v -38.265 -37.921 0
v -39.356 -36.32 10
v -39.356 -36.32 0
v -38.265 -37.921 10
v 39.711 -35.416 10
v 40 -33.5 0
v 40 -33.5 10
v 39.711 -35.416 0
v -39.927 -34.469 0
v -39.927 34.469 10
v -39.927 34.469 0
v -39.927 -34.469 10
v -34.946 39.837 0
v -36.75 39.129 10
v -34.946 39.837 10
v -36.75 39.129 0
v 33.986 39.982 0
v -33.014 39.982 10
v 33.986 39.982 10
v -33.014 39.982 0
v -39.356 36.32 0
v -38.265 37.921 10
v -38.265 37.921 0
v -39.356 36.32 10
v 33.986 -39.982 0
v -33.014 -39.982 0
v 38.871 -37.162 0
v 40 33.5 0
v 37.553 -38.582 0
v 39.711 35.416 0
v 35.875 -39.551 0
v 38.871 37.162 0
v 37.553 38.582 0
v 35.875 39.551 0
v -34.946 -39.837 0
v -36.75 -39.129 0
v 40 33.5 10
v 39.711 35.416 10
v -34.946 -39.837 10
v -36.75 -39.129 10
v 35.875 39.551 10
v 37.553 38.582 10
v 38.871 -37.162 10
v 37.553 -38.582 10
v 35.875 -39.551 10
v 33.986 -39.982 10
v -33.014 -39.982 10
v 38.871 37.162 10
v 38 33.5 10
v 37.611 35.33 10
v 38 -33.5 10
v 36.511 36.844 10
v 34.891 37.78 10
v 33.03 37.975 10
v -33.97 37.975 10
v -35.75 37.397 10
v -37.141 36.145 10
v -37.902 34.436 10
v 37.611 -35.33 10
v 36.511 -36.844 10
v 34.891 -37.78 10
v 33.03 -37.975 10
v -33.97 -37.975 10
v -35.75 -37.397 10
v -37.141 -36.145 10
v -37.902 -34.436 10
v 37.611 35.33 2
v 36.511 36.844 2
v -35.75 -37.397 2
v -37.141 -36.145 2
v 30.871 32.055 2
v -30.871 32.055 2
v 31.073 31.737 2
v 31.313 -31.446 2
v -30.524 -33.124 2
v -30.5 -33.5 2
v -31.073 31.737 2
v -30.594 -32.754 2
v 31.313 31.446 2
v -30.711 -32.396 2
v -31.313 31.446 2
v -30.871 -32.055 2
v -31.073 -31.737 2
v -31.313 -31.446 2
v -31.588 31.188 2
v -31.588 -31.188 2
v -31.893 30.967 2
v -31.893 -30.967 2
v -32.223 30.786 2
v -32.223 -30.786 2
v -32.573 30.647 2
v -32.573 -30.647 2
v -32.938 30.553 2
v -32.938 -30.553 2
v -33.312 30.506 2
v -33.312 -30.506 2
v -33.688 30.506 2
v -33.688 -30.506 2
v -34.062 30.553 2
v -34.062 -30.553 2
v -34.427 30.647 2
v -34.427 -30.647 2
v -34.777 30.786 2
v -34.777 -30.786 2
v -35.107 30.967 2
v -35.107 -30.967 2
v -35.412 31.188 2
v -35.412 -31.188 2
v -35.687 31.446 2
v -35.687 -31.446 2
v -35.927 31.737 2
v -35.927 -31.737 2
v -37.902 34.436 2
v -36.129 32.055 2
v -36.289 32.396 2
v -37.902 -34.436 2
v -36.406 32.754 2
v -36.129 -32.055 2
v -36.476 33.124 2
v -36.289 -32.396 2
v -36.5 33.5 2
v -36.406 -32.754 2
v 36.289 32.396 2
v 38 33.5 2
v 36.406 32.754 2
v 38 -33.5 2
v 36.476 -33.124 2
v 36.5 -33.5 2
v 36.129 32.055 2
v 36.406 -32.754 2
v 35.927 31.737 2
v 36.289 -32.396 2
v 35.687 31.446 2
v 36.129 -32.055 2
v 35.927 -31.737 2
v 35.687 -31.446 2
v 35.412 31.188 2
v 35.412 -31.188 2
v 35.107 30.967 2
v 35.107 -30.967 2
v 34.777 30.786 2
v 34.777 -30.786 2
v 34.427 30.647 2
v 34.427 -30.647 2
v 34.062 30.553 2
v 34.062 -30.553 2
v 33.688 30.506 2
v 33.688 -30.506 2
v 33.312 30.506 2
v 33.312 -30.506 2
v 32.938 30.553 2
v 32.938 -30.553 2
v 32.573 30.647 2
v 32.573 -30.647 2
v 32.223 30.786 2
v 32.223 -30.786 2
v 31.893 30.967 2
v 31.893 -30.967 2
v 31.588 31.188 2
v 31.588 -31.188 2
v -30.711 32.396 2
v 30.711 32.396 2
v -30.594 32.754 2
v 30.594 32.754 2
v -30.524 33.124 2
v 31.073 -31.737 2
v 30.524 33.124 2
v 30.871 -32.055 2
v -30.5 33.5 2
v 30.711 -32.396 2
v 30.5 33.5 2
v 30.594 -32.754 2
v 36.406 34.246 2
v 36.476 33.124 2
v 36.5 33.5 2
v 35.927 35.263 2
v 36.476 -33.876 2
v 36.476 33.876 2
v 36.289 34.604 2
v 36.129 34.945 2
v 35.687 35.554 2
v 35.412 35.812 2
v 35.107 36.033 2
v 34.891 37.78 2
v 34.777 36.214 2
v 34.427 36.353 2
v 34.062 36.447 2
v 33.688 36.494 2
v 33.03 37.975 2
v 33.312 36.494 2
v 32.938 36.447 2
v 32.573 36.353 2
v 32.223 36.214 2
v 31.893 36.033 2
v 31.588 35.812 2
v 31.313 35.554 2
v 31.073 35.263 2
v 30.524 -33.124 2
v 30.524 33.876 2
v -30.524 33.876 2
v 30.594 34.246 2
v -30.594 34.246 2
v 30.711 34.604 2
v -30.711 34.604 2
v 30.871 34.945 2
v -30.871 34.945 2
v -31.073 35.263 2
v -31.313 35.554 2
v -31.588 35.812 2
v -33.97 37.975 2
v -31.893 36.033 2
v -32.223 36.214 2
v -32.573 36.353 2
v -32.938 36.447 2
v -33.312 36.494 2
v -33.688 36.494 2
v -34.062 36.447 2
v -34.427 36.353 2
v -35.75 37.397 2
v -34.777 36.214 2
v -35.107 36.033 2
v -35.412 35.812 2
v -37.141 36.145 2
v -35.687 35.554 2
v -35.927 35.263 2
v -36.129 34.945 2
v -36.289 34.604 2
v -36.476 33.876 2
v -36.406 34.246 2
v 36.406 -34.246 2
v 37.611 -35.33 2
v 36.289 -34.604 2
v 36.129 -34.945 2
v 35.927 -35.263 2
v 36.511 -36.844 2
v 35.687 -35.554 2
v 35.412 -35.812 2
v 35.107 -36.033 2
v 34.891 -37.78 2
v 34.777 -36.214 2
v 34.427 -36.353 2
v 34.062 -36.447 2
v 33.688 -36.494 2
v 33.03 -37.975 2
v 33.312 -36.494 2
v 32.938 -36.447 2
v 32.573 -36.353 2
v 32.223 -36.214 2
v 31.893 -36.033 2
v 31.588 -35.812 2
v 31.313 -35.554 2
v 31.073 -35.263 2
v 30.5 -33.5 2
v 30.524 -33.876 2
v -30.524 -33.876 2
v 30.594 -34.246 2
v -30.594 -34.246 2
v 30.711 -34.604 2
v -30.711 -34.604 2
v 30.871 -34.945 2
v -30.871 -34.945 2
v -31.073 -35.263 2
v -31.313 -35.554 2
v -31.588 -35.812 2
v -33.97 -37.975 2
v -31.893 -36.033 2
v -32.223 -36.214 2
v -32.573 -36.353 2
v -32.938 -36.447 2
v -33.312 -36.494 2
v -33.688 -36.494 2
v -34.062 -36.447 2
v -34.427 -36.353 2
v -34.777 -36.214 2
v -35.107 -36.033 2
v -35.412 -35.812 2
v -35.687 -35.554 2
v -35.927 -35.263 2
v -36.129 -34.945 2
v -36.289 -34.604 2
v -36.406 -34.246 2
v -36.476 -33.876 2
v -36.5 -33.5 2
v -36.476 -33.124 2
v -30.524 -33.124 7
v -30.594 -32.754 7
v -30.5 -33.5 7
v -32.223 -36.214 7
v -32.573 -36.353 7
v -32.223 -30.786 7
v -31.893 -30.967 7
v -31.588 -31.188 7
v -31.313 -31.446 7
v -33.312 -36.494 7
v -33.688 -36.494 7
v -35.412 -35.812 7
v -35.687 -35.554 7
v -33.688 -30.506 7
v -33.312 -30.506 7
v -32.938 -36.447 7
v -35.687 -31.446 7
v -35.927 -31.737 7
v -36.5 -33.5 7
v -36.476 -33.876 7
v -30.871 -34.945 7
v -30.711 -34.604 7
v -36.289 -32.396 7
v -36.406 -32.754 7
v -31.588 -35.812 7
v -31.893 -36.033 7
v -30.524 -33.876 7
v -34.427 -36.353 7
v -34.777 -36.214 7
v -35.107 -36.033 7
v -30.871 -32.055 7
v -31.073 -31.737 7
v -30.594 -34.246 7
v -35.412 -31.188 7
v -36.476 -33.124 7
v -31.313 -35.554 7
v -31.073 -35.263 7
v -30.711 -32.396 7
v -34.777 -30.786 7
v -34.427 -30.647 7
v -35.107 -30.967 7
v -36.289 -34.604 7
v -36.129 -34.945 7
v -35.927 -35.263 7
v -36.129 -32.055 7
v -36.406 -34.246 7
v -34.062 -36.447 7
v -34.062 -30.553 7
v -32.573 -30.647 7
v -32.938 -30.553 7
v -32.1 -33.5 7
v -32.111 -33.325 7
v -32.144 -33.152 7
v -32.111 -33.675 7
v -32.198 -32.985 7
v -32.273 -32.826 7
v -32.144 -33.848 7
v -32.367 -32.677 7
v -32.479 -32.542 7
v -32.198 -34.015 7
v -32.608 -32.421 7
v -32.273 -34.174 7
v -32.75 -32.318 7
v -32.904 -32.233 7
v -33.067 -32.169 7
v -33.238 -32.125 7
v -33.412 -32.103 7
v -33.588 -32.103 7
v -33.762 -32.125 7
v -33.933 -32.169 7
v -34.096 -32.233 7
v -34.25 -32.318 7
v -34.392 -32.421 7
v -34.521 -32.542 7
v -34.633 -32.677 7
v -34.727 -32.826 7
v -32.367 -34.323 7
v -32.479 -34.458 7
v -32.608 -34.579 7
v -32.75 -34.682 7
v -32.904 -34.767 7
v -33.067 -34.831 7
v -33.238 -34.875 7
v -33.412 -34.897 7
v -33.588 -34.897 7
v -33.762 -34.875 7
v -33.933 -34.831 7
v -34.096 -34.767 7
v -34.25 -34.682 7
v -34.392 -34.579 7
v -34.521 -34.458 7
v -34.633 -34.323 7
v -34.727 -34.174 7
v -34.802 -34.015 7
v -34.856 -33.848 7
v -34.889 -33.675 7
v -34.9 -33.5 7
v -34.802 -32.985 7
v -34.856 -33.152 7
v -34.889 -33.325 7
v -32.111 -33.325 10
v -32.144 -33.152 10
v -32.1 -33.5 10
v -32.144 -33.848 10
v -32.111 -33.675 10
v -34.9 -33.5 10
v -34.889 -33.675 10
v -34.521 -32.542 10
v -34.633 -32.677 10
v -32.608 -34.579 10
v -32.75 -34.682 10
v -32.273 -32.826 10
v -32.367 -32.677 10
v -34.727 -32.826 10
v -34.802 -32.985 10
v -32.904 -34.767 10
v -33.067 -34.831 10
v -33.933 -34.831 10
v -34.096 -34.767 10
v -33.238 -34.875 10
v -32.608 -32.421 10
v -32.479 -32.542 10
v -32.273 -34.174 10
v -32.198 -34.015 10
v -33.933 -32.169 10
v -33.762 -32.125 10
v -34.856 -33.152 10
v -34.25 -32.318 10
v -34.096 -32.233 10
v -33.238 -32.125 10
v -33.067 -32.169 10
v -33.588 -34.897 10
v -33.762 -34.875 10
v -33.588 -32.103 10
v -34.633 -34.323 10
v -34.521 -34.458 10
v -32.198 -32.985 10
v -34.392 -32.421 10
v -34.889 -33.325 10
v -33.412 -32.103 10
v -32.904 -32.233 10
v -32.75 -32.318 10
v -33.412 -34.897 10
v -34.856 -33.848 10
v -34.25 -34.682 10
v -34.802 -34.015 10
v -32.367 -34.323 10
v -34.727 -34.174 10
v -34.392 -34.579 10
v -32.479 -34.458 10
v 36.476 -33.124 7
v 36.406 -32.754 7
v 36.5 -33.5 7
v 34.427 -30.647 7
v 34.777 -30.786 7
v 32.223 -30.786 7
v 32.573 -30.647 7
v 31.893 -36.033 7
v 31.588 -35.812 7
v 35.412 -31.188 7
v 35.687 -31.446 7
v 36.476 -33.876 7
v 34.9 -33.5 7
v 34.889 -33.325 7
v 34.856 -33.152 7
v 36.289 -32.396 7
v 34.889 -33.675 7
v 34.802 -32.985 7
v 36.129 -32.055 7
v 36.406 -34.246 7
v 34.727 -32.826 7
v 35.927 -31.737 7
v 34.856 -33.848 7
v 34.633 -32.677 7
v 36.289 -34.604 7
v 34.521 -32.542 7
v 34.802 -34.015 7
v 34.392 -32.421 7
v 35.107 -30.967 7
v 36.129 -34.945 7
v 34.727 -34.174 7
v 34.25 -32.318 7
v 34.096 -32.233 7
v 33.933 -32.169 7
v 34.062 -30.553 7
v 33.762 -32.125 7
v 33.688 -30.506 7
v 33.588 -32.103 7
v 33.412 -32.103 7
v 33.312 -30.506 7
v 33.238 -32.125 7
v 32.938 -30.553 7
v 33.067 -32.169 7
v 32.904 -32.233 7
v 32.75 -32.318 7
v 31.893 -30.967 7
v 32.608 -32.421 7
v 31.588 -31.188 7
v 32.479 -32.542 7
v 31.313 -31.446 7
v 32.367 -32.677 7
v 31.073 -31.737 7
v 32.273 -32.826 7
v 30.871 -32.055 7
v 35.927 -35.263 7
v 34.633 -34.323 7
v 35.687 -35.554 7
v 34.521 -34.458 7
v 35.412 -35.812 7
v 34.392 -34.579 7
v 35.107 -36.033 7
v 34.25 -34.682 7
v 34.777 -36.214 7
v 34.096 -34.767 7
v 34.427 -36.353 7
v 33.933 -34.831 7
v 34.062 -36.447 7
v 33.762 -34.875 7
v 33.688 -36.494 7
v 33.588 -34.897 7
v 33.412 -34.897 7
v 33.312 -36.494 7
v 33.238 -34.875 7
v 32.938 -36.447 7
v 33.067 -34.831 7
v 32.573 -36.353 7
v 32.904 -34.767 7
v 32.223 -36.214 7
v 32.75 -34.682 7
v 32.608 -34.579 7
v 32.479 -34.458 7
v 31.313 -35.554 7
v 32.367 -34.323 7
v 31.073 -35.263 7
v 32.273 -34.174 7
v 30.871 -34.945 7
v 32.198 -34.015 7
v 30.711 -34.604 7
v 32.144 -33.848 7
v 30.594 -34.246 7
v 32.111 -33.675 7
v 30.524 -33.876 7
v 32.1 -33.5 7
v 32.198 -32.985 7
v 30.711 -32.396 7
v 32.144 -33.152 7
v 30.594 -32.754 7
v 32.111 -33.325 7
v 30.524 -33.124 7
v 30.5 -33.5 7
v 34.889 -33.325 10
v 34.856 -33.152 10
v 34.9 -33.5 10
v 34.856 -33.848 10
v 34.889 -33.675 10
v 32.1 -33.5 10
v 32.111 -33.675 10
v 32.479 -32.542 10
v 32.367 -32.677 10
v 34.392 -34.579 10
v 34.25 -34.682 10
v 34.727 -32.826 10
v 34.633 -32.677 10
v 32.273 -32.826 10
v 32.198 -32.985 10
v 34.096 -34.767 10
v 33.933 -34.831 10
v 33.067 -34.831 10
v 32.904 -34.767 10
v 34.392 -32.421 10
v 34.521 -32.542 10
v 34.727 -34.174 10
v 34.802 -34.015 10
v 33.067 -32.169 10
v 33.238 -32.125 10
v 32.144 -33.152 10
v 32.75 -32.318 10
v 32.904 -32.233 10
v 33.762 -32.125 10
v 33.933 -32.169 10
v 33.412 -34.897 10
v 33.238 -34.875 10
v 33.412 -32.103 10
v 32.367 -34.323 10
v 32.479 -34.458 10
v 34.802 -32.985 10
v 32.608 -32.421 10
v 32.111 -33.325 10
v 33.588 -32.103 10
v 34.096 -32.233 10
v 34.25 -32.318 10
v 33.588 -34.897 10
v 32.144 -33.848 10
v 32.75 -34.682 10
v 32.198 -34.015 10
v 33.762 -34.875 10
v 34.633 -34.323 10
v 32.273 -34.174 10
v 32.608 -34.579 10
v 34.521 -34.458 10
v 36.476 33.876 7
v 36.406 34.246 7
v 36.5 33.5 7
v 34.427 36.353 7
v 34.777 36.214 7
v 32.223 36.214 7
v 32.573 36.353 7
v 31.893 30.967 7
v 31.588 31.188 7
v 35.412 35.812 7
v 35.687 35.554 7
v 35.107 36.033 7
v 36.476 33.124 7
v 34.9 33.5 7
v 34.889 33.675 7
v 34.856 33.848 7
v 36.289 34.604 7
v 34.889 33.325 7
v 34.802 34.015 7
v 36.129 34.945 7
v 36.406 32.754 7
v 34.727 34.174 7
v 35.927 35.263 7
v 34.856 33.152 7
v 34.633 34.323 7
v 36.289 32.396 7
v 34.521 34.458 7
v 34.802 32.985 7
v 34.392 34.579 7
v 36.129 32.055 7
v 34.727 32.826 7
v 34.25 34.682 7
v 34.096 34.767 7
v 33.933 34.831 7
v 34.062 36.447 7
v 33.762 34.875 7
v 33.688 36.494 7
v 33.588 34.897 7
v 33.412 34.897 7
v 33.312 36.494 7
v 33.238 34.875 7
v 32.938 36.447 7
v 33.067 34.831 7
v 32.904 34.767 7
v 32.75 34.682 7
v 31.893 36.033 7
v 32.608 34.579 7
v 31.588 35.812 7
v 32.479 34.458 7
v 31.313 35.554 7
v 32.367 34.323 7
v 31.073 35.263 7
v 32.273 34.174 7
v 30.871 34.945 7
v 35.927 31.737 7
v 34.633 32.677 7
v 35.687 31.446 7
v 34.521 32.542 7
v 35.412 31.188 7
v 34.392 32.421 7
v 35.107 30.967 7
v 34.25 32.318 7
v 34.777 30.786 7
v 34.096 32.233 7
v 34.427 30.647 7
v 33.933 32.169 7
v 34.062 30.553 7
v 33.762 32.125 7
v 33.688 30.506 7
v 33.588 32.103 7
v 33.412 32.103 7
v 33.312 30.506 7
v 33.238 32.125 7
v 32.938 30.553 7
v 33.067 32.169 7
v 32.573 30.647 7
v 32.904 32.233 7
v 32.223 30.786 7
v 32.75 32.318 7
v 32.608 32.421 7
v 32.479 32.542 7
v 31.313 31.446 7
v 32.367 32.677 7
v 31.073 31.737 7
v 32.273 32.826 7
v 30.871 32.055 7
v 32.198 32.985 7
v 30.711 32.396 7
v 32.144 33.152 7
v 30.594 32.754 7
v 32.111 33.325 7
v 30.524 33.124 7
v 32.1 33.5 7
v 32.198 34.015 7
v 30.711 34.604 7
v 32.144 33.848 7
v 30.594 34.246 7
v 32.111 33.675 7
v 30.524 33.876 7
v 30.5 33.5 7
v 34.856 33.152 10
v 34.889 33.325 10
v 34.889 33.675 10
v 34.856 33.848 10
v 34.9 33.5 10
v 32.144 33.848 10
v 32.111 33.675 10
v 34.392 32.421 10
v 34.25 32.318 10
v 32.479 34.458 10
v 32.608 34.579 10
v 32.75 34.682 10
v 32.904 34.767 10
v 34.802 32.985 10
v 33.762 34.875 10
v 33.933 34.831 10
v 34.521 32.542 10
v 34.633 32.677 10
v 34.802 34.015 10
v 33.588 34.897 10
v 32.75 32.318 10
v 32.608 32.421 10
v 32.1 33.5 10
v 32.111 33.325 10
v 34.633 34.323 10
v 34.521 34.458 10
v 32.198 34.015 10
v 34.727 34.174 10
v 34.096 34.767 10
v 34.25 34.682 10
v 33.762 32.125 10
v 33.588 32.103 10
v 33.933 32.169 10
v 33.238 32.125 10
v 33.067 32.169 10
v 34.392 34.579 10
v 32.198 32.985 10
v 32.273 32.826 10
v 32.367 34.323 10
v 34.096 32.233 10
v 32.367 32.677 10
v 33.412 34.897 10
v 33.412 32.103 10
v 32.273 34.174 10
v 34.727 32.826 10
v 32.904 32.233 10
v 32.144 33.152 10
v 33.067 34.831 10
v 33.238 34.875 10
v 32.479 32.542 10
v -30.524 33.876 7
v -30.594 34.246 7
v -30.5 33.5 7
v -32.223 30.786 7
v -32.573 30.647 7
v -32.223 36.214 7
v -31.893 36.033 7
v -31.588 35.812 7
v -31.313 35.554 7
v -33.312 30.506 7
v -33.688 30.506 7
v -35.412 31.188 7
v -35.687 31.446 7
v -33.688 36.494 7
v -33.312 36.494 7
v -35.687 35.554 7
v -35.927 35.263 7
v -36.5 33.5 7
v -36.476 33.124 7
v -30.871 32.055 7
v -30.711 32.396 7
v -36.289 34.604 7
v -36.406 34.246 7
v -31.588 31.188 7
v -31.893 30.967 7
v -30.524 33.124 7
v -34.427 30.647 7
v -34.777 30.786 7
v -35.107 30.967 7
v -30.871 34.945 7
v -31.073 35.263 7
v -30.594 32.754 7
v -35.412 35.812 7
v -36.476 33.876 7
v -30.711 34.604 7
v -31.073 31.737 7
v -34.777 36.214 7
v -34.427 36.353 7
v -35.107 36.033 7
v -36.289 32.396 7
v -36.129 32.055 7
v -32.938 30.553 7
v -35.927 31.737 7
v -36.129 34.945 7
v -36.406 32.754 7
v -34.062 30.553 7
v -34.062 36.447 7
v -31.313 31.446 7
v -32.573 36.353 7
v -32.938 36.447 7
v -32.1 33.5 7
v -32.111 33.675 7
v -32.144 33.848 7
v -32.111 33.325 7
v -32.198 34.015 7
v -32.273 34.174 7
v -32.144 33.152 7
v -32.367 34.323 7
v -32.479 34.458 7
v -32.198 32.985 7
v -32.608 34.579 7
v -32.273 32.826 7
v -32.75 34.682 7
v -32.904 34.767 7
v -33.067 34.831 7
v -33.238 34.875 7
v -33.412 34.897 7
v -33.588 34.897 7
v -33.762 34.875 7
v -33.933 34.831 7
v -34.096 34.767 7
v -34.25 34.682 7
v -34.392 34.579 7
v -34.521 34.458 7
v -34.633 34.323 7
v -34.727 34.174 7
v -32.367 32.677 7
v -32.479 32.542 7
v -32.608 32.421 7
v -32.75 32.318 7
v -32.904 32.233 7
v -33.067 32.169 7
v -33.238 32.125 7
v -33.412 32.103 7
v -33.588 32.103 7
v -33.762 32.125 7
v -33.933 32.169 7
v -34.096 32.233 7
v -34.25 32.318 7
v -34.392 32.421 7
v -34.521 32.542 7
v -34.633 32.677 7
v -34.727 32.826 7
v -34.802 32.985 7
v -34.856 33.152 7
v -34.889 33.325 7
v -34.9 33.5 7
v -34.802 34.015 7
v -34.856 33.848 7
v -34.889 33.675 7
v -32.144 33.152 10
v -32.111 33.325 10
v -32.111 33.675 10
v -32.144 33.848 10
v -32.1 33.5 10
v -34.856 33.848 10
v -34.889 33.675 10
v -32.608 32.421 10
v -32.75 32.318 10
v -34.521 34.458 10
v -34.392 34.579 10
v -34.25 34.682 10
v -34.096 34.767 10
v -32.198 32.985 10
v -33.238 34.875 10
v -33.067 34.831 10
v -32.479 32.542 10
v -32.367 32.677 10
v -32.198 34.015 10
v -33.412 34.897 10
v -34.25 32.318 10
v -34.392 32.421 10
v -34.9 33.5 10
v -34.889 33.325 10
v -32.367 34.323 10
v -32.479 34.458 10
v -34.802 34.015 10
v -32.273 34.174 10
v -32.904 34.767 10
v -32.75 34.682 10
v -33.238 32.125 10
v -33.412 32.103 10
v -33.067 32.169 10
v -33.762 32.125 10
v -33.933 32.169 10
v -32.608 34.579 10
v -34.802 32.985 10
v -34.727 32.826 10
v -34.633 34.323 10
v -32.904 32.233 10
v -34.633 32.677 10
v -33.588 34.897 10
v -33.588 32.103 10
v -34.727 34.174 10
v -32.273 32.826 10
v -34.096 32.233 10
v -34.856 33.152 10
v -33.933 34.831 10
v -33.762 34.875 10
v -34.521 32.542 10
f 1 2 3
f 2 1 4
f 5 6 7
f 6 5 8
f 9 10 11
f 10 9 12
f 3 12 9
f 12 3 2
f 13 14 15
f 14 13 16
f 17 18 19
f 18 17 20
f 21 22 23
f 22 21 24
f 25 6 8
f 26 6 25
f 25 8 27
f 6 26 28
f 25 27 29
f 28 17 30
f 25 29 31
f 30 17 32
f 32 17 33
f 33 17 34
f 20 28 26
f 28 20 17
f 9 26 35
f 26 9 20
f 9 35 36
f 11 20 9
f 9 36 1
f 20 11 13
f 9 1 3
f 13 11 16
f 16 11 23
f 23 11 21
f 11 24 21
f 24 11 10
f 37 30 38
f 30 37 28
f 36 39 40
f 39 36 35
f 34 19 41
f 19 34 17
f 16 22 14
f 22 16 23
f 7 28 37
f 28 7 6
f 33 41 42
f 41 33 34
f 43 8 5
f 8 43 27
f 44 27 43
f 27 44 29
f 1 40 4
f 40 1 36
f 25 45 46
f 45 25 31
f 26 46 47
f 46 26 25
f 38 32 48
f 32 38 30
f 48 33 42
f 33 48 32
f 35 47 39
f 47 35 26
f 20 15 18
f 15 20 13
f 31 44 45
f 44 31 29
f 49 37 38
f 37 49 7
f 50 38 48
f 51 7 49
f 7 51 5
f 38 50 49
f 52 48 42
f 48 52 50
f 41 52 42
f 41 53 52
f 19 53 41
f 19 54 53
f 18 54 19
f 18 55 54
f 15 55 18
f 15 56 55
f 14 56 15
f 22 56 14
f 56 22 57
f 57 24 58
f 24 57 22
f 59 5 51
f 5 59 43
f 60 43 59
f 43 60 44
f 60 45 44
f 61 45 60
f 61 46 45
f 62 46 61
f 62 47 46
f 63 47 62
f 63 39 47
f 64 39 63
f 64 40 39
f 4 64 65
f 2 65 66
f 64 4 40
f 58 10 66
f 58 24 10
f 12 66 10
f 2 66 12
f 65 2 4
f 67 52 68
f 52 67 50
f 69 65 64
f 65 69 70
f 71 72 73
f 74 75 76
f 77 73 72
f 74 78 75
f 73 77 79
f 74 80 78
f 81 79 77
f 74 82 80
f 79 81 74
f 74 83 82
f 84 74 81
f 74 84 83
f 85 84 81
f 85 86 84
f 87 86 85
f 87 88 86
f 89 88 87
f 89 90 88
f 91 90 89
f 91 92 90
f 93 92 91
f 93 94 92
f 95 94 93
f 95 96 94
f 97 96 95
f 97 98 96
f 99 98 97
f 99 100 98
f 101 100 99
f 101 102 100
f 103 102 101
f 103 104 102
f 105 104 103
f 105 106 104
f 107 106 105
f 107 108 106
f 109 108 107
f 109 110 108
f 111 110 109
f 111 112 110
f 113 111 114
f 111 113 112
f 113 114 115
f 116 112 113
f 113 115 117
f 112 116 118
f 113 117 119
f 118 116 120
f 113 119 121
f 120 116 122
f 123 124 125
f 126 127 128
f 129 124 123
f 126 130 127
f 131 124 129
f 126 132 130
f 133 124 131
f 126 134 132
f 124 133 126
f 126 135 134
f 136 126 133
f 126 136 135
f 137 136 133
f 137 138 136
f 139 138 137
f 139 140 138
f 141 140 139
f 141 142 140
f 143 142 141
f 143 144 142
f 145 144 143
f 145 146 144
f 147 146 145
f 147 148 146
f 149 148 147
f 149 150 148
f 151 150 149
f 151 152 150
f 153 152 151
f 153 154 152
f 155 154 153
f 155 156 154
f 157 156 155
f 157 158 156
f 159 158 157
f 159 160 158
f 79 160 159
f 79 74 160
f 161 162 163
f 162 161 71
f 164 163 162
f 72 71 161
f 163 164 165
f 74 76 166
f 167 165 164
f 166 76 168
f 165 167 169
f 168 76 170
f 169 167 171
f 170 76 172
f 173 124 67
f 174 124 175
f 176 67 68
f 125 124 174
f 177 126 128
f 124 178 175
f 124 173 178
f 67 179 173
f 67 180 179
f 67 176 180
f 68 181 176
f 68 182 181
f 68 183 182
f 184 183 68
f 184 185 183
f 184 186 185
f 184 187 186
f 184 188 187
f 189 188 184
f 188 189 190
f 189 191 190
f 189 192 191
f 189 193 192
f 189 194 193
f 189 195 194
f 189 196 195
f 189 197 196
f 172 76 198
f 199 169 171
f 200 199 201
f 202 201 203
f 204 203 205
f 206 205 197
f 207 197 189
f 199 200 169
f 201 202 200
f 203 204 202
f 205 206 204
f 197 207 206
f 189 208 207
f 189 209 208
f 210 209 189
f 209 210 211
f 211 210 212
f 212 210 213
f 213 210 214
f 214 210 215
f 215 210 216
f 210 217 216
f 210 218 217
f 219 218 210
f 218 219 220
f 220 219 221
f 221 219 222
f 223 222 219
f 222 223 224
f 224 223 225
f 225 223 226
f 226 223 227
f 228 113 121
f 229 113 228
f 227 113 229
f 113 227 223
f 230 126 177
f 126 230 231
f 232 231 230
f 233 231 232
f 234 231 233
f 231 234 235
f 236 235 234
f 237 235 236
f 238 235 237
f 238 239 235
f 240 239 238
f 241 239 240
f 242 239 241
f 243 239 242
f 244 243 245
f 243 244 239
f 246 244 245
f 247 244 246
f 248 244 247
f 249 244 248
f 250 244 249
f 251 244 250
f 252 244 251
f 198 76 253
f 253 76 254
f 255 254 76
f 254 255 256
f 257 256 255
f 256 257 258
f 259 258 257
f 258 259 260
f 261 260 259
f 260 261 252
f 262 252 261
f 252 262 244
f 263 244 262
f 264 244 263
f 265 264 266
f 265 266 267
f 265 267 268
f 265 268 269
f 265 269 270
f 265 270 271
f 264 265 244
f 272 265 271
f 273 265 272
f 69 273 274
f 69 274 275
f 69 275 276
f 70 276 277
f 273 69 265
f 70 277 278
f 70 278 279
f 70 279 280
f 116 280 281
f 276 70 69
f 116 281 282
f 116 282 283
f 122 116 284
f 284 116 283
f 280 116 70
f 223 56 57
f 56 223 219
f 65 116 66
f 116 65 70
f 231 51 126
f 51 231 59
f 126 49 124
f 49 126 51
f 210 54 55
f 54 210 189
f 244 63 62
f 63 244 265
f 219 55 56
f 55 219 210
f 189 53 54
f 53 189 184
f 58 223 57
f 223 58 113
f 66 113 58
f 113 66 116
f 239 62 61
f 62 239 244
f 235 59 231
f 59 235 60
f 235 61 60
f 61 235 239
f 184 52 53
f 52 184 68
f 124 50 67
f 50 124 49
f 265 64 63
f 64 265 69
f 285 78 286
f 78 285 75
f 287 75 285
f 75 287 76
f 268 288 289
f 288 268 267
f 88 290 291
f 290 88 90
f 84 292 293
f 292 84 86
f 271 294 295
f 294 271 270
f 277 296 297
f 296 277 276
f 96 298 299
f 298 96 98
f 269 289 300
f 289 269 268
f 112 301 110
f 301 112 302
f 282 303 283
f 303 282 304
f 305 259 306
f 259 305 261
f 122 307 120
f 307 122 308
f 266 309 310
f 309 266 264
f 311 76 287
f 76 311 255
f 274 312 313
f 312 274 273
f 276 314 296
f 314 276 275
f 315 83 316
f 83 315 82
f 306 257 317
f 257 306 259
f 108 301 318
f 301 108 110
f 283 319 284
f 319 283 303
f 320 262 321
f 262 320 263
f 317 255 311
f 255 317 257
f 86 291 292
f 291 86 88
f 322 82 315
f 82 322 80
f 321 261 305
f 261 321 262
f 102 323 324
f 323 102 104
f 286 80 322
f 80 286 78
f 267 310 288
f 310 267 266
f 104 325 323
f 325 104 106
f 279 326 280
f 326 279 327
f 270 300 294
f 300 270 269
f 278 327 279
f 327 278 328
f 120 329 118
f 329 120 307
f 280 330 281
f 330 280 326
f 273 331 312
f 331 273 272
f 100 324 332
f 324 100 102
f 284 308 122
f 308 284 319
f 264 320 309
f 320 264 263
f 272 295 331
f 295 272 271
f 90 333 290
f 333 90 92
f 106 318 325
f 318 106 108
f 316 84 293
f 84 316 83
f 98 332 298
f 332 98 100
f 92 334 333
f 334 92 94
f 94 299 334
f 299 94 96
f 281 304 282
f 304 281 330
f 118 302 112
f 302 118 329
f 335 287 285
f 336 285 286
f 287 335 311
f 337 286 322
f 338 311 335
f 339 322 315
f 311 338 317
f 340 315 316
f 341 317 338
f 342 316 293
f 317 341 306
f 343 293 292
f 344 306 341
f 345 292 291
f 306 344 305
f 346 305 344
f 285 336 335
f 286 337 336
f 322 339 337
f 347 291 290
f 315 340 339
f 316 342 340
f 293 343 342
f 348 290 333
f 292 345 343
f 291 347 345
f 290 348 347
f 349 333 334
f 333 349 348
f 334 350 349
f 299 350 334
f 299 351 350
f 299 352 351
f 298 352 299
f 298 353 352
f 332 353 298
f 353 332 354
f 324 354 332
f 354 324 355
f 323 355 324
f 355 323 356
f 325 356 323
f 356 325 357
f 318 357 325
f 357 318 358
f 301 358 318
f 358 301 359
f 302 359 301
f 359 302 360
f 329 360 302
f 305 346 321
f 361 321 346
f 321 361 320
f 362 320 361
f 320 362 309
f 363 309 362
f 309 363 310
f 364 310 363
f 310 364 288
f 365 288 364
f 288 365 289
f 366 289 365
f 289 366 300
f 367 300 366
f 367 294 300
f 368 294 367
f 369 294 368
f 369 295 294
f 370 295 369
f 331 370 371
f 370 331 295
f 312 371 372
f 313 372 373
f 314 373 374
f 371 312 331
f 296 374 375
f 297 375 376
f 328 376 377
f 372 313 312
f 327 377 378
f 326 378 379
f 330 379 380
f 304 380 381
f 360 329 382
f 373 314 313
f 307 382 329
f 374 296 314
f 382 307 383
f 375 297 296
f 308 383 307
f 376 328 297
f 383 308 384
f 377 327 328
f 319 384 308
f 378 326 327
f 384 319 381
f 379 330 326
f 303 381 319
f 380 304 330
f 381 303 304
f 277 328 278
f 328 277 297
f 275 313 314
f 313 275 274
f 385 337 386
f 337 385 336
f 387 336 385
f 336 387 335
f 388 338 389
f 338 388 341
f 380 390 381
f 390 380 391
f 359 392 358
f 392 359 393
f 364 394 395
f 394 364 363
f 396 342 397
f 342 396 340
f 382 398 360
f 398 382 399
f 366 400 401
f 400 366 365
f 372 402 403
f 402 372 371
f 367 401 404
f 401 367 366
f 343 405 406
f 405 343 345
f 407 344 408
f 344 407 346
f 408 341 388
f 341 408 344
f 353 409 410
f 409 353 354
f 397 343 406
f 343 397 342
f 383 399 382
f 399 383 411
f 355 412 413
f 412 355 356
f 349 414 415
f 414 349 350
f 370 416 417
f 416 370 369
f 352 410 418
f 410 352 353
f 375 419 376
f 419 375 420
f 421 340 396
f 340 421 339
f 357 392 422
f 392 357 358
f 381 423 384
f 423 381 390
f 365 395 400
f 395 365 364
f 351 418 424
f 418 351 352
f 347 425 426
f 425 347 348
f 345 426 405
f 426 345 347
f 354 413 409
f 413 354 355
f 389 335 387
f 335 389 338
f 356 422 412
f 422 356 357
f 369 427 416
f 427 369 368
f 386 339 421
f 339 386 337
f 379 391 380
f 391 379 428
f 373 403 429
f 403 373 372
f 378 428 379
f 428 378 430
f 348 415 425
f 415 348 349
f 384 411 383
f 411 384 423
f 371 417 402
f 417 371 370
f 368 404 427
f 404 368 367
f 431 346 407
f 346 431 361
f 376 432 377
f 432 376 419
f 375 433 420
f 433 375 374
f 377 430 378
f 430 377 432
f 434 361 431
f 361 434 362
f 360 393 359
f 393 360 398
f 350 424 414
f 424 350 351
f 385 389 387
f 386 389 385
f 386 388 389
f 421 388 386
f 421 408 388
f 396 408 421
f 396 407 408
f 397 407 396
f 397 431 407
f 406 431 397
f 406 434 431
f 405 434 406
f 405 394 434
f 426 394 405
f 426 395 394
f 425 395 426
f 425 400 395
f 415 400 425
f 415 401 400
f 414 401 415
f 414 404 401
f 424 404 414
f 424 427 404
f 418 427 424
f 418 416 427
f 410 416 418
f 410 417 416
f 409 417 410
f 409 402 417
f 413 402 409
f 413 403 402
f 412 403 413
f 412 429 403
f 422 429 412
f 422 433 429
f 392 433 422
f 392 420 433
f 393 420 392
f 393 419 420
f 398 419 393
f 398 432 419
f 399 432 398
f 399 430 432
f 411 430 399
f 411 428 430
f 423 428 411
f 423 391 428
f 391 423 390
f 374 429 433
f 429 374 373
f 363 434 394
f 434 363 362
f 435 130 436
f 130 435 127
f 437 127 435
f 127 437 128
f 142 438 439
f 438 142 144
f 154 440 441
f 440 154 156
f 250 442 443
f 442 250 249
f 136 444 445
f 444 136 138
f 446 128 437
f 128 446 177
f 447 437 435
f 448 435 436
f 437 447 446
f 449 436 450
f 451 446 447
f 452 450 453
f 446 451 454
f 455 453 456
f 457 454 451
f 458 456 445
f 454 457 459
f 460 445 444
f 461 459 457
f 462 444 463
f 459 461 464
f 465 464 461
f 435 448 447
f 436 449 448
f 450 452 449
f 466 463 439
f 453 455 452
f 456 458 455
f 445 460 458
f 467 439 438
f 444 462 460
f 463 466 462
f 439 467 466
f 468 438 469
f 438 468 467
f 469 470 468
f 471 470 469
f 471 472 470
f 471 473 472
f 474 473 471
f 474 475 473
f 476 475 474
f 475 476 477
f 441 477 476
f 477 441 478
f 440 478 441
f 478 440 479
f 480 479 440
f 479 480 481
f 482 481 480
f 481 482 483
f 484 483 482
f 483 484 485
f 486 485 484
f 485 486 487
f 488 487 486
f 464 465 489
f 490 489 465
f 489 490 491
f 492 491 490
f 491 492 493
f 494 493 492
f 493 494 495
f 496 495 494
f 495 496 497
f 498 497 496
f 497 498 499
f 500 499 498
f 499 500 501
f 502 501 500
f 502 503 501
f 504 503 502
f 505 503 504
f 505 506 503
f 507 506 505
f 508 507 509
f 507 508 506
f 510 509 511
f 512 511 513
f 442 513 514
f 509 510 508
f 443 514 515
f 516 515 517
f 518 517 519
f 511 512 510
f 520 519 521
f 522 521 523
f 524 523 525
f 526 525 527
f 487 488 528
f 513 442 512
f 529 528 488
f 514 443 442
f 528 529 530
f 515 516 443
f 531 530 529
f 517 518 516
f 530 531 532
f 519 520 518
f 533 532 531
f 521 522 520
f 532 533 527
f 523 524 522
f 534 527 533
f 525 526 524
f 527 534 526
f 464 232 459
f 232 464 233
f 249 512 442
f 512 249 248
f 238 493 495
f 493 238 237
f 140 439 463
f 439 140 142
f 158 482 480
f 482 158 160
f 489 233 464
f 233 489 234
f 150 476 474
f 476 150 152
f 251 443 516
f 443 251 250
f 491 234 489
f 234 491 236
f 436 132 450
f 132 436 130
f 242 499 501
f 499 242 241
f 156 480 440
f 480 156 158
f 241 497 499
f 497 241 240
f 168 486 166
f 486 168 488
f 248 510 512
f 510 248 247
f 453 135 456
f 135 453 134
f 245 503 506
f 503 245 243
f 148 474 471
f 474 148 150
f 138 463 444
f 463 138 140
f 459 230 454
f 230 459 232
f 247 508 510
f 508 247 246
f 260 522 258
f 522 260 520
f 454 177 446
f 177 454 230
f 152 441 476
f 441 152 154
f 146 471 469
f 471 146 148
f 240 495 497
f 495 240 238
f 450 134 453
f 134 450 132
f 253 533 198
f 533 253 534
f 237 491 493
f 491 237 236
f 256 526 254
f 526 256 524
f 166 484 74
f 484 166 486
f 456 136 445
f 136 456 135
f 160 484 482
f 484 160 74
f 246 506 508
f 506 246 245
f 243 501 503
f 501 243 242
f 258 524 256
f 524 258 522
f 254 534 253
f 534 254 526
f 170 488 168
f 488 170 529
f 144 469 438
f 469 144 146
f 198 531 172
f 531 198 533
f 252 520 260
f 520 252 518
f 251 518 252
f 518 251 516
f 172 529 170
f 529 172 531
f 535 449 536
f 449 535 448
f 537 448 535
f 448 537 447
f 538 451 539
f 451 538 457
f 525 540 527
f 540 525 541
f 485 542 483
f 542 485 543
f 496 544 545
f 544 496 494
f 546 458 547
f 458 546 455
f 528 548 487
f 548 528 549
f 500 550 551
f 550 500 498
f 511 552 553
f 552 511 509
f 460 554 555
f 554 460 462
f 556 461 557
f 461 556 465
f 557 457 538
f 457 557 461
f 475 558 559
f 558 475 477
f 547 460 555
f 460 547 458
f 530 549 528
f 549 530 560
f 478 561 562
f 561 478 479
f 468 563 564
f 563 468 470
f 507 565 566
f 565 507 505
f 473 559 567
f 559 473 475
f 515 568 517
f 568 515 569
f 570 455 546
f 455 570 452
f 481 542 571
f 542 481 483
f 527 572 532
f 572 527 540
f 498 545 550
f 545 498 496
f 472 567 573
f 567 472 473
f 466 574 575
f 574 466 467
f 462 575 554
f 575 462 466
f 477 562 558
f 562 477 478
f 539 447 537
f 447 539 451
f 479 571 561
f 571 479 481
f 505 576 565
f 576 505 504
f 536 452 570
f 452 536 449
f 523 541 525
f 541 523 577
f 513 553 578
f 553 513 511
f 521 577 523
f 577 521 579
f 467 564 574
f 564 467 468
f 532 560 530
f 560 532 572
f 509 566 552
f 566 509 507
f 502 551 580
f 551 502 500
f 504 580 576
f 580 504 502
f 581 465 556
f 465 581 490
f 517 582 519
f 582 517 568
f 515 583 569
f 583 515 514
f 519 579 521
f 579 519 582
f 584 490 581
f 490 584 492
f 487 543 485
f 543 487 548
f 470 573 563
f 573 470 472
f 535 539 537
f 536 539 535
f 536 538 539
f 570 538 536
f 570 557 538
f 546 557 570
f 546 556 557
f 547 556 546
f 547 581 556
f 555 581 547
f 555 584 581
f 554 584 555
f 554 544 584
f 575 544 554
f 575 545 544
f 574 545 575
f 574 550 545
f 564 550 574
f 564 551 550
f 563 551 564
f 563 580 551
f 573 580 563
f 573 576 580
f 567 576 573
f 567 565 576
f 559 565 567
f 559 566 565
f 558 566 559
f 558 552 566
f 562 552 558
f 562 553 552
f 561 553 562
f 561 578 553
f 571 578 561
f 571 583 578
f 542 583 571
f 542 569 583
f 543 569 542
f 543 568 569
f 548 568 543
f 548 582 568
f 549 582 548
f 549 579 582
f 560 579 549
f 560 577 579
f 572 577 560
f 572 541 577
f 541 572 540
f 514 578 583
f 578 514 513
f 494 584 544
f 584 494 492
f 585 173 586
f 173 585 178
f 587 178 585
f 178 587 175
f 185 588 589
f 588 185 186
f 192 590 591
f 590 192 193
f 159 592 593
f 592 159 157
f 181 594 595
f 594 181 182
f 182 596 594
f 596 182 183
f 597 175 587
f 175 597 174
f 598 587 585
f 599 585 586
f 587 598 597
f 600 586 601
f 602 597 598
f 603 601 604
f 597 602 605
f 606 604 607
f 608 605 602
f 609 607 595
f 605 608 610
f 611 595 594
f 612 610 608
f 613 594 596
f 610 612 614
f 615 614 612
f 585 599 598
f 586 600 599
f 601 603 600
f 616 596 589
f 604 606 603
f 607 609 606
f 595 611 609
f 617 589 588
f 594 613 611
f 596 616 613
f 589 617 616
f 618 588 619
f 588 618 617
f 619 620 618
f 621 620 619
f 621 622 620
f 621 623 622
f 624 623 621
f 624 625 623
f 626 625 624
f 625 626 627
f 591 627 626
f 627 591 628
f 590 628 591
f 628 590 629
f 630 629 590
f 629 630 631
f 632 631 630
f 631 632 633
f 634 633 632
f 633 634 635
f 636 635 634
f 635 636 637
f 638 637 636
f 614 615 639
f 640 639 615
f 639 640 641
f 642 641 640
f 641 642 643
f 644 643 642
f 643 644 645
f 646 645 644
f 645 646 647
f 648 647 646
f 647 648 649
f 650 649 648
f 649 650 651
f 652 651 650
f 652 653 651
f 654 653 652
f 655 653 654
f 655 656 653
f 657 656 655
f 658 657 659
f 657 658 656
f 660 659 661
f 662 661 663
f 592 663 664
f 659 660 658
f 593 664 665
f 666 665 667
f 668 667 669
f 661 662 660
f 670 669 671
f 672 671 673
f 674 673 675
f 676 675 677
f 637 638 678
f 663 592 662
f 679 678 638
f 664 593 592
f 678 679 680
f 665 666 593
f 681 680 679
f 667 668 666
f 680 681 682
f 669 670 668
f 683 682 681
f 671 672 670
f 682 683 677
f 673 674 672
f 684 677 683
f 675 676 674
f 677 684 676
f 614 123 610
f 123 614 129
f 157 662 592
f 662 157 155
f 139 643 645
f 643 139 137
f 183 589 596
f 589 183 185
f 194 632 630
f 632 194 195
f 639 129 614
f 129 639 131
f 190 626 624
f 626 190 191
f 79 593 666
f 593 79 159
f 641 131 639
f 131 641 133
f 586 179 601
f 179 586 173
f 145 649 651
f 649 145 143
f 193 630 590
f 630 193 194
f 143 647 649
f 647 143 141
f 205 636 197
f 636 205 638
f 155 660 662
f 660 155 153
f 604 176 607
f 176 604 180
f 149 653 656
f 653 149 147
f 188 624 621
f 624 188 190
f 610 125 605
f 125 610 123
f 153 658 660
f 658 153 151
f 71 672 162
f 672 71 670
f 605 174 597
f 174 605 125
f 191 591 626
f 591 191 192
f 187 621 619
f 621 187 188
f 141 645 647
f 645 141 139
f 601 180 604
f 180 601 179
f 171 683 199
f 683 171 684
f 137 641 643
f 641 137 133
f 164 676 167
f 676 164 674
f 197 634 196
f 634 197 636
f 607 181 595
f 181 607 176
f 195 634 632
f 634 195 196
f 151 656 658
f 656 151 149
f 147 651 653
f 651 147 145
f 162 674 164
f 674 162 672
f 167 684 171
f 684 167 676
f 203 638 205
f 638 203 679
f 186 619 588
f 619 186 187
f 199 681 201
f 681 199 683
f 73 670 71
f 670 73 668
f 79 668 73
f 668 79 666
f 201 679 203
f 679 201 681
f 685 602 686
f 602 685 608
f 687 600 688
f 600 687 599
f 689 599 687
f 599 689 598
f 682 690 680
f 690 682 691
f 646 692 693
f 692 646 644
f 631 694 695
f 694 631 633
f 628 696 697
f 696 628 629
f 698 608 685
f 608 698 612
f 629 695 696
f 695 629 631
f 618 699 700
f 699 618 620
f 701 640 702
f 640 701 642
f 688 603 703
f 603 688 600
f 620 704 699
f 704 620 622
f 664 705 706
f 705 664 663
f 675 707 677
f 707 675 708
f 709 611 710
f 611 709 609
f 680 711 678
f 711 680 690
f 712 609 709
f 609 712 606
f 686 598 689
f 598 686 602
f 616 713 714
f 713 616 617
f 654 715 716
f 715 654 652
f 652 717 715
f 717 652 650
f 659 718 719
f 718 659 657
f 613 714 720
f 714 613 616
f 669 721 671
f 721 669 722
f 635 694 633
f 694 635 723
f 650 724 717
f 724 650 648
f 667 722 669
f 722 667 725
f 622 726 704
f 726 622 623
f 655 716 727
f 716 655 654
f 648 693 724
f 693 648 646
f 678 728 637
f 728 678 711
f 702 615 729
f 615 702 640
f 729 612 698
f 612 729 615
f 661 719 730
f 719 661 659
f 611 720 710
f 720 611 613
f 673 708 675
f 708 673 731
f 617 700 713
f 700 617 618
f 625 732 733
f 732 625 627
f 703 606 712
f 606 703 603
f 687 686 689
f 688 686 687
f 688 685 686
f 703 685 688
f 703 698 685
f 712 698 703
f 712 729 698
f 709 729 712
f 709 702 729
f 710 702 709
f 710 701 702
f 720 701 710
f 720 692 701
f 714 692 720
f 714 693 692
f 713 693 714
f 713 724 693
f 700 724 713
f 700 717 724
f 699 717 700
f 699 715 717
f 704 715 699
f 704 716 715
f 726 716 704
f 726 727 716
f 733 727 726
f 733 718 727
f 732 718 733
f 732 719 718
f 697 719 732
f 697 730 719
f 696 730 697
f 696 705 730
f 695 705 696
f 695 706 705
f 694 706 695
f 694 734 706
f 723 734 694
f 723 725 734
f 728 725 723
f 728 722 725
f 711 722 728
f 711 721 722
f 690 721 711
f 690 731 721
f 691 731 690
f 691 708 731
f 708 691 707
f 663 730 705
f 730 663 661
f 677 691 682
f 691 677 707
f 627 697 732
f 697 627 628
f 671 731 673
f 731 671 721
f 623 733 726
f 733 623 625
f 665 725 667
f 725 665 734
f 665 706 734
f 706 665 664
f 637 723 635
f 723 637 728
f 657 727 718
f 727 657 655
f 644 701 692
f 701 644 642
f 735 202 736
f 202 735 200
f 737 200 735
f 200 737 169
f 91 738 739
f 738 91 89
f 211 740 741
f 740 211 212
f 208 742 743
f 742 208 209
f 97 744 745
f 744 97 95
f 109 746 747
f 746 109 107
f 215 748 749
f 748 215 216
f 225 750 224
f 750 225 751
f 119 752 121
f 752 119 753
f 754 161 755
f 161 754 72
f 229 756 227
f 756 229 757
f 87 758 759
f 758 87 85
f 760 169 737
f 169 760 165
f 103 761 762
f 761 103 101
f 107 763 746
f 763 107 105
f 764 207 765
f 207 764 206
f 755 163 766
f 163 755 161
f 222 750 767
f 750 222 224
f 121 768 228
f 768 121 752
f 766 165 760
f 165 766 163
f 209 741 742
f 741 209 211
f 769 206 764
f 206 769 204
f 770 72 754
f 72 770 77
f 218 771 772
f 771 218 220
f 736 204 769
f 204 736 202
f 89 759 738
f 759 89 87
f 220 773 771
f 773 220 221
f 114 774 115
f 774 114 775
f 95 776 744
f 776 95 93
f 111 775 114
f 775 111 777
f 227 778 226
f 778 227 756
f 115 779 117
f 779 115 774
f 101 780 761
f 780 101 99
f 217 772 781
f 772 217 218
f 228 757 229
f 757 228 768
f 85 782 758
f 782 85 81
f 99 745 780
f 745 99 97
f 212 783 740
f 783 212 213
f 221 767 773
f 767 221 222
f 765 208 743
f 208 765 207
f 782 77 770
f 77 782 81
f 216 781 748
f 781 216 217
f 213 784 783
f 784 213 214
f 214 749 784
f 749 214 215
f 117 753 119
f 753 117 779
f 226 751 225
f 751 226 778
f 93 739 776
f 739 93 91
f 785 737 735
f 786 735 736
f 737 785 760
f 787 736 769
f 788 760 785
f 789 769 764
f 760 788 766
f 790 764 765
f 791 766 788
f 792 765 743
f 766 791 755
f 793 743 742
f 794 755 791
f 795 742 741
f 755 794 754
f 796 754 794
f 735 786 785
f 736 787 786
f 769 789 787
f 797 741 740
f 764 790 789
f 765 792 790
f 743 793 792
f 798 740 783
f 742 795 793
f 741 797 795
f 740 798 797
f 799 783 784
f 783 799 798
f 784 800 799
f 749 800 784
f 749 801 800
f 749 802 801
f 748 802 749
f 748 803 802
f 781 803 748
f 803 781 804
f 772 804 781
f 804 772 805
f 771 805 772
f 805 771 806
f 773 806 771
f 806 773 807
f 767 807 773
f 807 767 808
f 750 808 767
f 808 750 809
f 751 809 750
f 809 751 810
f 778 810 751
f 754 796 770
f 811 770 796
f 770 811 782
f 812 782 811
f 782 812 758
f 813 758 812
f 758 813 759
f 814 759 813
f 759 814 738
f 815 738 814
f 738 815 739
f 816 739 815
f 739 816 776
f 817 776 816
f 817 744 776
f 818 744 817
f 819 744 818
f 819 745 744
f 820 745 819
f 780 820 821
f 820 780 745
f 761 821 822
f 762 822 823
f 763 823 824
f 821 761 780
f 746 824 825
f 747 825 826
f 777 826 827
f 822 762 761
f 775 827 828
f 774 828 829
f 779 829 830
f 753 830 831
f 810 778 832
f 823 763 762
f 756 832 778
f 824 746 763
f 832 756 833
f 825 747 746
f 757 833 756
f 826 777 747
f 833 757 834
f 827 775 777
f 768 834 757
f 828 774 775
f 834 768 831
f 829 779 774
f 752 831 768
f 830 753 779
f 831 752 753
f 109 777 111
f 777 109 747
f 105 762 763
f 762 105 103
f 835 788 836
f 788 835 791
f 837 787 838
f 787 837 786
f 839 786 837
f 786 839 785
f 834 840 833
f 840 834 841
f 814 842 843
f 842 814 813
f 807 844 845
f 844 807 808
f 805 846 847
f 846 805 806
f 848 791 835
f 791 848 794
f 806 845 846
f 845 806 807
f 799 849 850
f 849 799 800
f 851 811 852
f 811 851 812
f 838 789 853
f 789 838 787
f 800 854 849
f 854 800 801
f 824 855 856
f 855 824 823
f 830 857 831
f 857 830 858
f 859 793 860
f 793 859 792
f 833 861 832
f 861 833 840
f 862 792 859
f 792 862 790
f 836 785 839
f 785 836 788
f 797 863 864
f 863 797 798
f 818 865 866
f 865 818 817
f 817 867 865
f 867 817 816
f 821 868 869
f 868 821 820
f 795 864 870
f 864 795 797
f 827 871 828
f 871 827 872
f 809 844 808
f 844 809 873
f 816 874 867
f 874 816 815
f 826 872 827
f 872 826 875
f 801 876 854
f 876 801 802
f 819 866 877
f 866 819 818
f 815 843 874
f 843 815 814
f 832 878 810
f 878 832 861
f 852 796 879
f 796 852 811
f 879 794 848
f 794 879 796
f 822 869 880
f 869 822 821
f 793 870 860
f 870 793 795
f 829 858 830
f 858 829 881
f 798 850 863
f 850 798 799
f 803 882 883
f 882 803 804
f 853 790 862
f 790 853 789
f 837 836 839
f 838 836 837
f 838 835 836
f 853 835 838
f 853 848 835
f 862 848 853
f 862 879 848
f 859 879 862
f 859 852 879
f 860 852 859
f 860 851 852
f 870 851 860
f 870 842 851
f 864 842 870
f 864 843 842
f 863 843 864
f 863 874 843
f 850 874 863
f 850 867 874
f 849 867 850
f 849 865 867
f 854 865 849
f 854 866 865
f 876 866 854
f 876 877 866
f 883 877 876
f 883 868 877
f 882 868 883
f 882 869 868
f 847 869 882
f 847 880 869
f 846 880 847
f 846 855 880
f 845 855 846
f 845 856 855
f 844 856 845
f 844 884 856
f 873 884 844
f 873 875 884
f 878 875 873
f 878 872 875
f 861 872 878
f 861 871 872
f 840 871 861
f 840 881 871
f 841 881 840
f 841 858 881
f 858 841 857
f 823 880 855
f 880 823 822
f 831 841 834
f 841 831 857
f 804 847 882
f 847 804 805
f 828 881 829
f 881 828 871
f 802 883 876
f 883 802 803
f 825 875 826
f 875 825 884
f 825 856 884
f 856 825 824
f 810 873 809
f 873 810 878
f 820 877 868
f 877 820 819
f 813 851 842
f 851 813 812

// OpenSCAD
// Parametric Bottom Enclosure Box for PCB

// PCB Parameters
pcb_length = 75; // mm
pcb_width = 75; // mm
pcb_corner_radius = 4; // mm
hole_diameter = 3; // mm
hole_offset = 4; // mm from each corner

// Box Parameters
clearance = 0.5; // mm around PCB
wall_height = 8; // mm
wall_thickness = 2; // mm (adjustable)
base_thickness = 2; // mm (adjustable)
post_height = 5; // mm
post_radius = 3; // mm (adjustable, should be larger than pin)
pin_height = 3; // mm
pin_clearance = 0.1; // mm for fit

// Calculated Values (do not edit)
inner_length = pcb_length + 2 * clearance;
inner_width = pcb_width + 2 * clearance;
inner_corner_radius = pcb_corner_radius + clearance;
outer_length = inner_length + 2 * wall_thickness;
outer_width = inner_width + 2 * wall_thickness;
outer_corner_radius = inner_corner_radius + wall_thickness;
pin_radius = (hole_diameter / 2) - pin_clearance;

// Hole positions relative to center
hole_bl = [-pcb_length/2 + hole_offset, -pcb_width/2 + hole_offset];
hole_br = [pcb_length/2 - hole_offset, -pcb_width/2 + hole_offset];
hole_tr = [pcb_length/2 - hole_offset, pcb_width/2 - hole_offset];
hole_tl = [-pcb_length/2 + hole_offset, pcb_width/2 - hole_offset];

// Module for rounded square (2D)
module rounded_square(width, length, radius) {
    hull() {
        translate([radius, radius]) circle(r = radius);
        translate([width - radius, radius]) circle(r = radius);
        translate([width - radius, length - radius]) circle(r = radius);
        translate([radius, length - radius]) circle(r = radius);
    }
}

// Main model
union() {
    // Box shell
    difference() {
        // Outer solid
        linear_extrude(height = base_thickness + wall_height)
            translate([-outer_length/2, -outer_width/2])
                rounded_square(outer_length, outer_width, outer_corner_radius);
        
        // Inner cavity
        translate([0, 0, base_thickness])
            linear_extrude(height = wall_height + 1)
                translate([-inner_length/2, -inner_width/2])
                    rounded_square(inner_length, inner_width, inner_corner_radius);
    }
    
    // Mounting posts and pins
    for (pos = [hole_bl, hole_br, hole_tr, hole_tl]) {
        // Post
        translate([pos[0], pos[1], base_thickness])
            cylinder(h = post_height, r = post_radius, $fn = 50);
        
        // Pin
        translate([pos[0], pos[1], base_thickness + post_height])
            cylinder(h = pin_height, r = pin_radius, $fn = 50);
    }
}
